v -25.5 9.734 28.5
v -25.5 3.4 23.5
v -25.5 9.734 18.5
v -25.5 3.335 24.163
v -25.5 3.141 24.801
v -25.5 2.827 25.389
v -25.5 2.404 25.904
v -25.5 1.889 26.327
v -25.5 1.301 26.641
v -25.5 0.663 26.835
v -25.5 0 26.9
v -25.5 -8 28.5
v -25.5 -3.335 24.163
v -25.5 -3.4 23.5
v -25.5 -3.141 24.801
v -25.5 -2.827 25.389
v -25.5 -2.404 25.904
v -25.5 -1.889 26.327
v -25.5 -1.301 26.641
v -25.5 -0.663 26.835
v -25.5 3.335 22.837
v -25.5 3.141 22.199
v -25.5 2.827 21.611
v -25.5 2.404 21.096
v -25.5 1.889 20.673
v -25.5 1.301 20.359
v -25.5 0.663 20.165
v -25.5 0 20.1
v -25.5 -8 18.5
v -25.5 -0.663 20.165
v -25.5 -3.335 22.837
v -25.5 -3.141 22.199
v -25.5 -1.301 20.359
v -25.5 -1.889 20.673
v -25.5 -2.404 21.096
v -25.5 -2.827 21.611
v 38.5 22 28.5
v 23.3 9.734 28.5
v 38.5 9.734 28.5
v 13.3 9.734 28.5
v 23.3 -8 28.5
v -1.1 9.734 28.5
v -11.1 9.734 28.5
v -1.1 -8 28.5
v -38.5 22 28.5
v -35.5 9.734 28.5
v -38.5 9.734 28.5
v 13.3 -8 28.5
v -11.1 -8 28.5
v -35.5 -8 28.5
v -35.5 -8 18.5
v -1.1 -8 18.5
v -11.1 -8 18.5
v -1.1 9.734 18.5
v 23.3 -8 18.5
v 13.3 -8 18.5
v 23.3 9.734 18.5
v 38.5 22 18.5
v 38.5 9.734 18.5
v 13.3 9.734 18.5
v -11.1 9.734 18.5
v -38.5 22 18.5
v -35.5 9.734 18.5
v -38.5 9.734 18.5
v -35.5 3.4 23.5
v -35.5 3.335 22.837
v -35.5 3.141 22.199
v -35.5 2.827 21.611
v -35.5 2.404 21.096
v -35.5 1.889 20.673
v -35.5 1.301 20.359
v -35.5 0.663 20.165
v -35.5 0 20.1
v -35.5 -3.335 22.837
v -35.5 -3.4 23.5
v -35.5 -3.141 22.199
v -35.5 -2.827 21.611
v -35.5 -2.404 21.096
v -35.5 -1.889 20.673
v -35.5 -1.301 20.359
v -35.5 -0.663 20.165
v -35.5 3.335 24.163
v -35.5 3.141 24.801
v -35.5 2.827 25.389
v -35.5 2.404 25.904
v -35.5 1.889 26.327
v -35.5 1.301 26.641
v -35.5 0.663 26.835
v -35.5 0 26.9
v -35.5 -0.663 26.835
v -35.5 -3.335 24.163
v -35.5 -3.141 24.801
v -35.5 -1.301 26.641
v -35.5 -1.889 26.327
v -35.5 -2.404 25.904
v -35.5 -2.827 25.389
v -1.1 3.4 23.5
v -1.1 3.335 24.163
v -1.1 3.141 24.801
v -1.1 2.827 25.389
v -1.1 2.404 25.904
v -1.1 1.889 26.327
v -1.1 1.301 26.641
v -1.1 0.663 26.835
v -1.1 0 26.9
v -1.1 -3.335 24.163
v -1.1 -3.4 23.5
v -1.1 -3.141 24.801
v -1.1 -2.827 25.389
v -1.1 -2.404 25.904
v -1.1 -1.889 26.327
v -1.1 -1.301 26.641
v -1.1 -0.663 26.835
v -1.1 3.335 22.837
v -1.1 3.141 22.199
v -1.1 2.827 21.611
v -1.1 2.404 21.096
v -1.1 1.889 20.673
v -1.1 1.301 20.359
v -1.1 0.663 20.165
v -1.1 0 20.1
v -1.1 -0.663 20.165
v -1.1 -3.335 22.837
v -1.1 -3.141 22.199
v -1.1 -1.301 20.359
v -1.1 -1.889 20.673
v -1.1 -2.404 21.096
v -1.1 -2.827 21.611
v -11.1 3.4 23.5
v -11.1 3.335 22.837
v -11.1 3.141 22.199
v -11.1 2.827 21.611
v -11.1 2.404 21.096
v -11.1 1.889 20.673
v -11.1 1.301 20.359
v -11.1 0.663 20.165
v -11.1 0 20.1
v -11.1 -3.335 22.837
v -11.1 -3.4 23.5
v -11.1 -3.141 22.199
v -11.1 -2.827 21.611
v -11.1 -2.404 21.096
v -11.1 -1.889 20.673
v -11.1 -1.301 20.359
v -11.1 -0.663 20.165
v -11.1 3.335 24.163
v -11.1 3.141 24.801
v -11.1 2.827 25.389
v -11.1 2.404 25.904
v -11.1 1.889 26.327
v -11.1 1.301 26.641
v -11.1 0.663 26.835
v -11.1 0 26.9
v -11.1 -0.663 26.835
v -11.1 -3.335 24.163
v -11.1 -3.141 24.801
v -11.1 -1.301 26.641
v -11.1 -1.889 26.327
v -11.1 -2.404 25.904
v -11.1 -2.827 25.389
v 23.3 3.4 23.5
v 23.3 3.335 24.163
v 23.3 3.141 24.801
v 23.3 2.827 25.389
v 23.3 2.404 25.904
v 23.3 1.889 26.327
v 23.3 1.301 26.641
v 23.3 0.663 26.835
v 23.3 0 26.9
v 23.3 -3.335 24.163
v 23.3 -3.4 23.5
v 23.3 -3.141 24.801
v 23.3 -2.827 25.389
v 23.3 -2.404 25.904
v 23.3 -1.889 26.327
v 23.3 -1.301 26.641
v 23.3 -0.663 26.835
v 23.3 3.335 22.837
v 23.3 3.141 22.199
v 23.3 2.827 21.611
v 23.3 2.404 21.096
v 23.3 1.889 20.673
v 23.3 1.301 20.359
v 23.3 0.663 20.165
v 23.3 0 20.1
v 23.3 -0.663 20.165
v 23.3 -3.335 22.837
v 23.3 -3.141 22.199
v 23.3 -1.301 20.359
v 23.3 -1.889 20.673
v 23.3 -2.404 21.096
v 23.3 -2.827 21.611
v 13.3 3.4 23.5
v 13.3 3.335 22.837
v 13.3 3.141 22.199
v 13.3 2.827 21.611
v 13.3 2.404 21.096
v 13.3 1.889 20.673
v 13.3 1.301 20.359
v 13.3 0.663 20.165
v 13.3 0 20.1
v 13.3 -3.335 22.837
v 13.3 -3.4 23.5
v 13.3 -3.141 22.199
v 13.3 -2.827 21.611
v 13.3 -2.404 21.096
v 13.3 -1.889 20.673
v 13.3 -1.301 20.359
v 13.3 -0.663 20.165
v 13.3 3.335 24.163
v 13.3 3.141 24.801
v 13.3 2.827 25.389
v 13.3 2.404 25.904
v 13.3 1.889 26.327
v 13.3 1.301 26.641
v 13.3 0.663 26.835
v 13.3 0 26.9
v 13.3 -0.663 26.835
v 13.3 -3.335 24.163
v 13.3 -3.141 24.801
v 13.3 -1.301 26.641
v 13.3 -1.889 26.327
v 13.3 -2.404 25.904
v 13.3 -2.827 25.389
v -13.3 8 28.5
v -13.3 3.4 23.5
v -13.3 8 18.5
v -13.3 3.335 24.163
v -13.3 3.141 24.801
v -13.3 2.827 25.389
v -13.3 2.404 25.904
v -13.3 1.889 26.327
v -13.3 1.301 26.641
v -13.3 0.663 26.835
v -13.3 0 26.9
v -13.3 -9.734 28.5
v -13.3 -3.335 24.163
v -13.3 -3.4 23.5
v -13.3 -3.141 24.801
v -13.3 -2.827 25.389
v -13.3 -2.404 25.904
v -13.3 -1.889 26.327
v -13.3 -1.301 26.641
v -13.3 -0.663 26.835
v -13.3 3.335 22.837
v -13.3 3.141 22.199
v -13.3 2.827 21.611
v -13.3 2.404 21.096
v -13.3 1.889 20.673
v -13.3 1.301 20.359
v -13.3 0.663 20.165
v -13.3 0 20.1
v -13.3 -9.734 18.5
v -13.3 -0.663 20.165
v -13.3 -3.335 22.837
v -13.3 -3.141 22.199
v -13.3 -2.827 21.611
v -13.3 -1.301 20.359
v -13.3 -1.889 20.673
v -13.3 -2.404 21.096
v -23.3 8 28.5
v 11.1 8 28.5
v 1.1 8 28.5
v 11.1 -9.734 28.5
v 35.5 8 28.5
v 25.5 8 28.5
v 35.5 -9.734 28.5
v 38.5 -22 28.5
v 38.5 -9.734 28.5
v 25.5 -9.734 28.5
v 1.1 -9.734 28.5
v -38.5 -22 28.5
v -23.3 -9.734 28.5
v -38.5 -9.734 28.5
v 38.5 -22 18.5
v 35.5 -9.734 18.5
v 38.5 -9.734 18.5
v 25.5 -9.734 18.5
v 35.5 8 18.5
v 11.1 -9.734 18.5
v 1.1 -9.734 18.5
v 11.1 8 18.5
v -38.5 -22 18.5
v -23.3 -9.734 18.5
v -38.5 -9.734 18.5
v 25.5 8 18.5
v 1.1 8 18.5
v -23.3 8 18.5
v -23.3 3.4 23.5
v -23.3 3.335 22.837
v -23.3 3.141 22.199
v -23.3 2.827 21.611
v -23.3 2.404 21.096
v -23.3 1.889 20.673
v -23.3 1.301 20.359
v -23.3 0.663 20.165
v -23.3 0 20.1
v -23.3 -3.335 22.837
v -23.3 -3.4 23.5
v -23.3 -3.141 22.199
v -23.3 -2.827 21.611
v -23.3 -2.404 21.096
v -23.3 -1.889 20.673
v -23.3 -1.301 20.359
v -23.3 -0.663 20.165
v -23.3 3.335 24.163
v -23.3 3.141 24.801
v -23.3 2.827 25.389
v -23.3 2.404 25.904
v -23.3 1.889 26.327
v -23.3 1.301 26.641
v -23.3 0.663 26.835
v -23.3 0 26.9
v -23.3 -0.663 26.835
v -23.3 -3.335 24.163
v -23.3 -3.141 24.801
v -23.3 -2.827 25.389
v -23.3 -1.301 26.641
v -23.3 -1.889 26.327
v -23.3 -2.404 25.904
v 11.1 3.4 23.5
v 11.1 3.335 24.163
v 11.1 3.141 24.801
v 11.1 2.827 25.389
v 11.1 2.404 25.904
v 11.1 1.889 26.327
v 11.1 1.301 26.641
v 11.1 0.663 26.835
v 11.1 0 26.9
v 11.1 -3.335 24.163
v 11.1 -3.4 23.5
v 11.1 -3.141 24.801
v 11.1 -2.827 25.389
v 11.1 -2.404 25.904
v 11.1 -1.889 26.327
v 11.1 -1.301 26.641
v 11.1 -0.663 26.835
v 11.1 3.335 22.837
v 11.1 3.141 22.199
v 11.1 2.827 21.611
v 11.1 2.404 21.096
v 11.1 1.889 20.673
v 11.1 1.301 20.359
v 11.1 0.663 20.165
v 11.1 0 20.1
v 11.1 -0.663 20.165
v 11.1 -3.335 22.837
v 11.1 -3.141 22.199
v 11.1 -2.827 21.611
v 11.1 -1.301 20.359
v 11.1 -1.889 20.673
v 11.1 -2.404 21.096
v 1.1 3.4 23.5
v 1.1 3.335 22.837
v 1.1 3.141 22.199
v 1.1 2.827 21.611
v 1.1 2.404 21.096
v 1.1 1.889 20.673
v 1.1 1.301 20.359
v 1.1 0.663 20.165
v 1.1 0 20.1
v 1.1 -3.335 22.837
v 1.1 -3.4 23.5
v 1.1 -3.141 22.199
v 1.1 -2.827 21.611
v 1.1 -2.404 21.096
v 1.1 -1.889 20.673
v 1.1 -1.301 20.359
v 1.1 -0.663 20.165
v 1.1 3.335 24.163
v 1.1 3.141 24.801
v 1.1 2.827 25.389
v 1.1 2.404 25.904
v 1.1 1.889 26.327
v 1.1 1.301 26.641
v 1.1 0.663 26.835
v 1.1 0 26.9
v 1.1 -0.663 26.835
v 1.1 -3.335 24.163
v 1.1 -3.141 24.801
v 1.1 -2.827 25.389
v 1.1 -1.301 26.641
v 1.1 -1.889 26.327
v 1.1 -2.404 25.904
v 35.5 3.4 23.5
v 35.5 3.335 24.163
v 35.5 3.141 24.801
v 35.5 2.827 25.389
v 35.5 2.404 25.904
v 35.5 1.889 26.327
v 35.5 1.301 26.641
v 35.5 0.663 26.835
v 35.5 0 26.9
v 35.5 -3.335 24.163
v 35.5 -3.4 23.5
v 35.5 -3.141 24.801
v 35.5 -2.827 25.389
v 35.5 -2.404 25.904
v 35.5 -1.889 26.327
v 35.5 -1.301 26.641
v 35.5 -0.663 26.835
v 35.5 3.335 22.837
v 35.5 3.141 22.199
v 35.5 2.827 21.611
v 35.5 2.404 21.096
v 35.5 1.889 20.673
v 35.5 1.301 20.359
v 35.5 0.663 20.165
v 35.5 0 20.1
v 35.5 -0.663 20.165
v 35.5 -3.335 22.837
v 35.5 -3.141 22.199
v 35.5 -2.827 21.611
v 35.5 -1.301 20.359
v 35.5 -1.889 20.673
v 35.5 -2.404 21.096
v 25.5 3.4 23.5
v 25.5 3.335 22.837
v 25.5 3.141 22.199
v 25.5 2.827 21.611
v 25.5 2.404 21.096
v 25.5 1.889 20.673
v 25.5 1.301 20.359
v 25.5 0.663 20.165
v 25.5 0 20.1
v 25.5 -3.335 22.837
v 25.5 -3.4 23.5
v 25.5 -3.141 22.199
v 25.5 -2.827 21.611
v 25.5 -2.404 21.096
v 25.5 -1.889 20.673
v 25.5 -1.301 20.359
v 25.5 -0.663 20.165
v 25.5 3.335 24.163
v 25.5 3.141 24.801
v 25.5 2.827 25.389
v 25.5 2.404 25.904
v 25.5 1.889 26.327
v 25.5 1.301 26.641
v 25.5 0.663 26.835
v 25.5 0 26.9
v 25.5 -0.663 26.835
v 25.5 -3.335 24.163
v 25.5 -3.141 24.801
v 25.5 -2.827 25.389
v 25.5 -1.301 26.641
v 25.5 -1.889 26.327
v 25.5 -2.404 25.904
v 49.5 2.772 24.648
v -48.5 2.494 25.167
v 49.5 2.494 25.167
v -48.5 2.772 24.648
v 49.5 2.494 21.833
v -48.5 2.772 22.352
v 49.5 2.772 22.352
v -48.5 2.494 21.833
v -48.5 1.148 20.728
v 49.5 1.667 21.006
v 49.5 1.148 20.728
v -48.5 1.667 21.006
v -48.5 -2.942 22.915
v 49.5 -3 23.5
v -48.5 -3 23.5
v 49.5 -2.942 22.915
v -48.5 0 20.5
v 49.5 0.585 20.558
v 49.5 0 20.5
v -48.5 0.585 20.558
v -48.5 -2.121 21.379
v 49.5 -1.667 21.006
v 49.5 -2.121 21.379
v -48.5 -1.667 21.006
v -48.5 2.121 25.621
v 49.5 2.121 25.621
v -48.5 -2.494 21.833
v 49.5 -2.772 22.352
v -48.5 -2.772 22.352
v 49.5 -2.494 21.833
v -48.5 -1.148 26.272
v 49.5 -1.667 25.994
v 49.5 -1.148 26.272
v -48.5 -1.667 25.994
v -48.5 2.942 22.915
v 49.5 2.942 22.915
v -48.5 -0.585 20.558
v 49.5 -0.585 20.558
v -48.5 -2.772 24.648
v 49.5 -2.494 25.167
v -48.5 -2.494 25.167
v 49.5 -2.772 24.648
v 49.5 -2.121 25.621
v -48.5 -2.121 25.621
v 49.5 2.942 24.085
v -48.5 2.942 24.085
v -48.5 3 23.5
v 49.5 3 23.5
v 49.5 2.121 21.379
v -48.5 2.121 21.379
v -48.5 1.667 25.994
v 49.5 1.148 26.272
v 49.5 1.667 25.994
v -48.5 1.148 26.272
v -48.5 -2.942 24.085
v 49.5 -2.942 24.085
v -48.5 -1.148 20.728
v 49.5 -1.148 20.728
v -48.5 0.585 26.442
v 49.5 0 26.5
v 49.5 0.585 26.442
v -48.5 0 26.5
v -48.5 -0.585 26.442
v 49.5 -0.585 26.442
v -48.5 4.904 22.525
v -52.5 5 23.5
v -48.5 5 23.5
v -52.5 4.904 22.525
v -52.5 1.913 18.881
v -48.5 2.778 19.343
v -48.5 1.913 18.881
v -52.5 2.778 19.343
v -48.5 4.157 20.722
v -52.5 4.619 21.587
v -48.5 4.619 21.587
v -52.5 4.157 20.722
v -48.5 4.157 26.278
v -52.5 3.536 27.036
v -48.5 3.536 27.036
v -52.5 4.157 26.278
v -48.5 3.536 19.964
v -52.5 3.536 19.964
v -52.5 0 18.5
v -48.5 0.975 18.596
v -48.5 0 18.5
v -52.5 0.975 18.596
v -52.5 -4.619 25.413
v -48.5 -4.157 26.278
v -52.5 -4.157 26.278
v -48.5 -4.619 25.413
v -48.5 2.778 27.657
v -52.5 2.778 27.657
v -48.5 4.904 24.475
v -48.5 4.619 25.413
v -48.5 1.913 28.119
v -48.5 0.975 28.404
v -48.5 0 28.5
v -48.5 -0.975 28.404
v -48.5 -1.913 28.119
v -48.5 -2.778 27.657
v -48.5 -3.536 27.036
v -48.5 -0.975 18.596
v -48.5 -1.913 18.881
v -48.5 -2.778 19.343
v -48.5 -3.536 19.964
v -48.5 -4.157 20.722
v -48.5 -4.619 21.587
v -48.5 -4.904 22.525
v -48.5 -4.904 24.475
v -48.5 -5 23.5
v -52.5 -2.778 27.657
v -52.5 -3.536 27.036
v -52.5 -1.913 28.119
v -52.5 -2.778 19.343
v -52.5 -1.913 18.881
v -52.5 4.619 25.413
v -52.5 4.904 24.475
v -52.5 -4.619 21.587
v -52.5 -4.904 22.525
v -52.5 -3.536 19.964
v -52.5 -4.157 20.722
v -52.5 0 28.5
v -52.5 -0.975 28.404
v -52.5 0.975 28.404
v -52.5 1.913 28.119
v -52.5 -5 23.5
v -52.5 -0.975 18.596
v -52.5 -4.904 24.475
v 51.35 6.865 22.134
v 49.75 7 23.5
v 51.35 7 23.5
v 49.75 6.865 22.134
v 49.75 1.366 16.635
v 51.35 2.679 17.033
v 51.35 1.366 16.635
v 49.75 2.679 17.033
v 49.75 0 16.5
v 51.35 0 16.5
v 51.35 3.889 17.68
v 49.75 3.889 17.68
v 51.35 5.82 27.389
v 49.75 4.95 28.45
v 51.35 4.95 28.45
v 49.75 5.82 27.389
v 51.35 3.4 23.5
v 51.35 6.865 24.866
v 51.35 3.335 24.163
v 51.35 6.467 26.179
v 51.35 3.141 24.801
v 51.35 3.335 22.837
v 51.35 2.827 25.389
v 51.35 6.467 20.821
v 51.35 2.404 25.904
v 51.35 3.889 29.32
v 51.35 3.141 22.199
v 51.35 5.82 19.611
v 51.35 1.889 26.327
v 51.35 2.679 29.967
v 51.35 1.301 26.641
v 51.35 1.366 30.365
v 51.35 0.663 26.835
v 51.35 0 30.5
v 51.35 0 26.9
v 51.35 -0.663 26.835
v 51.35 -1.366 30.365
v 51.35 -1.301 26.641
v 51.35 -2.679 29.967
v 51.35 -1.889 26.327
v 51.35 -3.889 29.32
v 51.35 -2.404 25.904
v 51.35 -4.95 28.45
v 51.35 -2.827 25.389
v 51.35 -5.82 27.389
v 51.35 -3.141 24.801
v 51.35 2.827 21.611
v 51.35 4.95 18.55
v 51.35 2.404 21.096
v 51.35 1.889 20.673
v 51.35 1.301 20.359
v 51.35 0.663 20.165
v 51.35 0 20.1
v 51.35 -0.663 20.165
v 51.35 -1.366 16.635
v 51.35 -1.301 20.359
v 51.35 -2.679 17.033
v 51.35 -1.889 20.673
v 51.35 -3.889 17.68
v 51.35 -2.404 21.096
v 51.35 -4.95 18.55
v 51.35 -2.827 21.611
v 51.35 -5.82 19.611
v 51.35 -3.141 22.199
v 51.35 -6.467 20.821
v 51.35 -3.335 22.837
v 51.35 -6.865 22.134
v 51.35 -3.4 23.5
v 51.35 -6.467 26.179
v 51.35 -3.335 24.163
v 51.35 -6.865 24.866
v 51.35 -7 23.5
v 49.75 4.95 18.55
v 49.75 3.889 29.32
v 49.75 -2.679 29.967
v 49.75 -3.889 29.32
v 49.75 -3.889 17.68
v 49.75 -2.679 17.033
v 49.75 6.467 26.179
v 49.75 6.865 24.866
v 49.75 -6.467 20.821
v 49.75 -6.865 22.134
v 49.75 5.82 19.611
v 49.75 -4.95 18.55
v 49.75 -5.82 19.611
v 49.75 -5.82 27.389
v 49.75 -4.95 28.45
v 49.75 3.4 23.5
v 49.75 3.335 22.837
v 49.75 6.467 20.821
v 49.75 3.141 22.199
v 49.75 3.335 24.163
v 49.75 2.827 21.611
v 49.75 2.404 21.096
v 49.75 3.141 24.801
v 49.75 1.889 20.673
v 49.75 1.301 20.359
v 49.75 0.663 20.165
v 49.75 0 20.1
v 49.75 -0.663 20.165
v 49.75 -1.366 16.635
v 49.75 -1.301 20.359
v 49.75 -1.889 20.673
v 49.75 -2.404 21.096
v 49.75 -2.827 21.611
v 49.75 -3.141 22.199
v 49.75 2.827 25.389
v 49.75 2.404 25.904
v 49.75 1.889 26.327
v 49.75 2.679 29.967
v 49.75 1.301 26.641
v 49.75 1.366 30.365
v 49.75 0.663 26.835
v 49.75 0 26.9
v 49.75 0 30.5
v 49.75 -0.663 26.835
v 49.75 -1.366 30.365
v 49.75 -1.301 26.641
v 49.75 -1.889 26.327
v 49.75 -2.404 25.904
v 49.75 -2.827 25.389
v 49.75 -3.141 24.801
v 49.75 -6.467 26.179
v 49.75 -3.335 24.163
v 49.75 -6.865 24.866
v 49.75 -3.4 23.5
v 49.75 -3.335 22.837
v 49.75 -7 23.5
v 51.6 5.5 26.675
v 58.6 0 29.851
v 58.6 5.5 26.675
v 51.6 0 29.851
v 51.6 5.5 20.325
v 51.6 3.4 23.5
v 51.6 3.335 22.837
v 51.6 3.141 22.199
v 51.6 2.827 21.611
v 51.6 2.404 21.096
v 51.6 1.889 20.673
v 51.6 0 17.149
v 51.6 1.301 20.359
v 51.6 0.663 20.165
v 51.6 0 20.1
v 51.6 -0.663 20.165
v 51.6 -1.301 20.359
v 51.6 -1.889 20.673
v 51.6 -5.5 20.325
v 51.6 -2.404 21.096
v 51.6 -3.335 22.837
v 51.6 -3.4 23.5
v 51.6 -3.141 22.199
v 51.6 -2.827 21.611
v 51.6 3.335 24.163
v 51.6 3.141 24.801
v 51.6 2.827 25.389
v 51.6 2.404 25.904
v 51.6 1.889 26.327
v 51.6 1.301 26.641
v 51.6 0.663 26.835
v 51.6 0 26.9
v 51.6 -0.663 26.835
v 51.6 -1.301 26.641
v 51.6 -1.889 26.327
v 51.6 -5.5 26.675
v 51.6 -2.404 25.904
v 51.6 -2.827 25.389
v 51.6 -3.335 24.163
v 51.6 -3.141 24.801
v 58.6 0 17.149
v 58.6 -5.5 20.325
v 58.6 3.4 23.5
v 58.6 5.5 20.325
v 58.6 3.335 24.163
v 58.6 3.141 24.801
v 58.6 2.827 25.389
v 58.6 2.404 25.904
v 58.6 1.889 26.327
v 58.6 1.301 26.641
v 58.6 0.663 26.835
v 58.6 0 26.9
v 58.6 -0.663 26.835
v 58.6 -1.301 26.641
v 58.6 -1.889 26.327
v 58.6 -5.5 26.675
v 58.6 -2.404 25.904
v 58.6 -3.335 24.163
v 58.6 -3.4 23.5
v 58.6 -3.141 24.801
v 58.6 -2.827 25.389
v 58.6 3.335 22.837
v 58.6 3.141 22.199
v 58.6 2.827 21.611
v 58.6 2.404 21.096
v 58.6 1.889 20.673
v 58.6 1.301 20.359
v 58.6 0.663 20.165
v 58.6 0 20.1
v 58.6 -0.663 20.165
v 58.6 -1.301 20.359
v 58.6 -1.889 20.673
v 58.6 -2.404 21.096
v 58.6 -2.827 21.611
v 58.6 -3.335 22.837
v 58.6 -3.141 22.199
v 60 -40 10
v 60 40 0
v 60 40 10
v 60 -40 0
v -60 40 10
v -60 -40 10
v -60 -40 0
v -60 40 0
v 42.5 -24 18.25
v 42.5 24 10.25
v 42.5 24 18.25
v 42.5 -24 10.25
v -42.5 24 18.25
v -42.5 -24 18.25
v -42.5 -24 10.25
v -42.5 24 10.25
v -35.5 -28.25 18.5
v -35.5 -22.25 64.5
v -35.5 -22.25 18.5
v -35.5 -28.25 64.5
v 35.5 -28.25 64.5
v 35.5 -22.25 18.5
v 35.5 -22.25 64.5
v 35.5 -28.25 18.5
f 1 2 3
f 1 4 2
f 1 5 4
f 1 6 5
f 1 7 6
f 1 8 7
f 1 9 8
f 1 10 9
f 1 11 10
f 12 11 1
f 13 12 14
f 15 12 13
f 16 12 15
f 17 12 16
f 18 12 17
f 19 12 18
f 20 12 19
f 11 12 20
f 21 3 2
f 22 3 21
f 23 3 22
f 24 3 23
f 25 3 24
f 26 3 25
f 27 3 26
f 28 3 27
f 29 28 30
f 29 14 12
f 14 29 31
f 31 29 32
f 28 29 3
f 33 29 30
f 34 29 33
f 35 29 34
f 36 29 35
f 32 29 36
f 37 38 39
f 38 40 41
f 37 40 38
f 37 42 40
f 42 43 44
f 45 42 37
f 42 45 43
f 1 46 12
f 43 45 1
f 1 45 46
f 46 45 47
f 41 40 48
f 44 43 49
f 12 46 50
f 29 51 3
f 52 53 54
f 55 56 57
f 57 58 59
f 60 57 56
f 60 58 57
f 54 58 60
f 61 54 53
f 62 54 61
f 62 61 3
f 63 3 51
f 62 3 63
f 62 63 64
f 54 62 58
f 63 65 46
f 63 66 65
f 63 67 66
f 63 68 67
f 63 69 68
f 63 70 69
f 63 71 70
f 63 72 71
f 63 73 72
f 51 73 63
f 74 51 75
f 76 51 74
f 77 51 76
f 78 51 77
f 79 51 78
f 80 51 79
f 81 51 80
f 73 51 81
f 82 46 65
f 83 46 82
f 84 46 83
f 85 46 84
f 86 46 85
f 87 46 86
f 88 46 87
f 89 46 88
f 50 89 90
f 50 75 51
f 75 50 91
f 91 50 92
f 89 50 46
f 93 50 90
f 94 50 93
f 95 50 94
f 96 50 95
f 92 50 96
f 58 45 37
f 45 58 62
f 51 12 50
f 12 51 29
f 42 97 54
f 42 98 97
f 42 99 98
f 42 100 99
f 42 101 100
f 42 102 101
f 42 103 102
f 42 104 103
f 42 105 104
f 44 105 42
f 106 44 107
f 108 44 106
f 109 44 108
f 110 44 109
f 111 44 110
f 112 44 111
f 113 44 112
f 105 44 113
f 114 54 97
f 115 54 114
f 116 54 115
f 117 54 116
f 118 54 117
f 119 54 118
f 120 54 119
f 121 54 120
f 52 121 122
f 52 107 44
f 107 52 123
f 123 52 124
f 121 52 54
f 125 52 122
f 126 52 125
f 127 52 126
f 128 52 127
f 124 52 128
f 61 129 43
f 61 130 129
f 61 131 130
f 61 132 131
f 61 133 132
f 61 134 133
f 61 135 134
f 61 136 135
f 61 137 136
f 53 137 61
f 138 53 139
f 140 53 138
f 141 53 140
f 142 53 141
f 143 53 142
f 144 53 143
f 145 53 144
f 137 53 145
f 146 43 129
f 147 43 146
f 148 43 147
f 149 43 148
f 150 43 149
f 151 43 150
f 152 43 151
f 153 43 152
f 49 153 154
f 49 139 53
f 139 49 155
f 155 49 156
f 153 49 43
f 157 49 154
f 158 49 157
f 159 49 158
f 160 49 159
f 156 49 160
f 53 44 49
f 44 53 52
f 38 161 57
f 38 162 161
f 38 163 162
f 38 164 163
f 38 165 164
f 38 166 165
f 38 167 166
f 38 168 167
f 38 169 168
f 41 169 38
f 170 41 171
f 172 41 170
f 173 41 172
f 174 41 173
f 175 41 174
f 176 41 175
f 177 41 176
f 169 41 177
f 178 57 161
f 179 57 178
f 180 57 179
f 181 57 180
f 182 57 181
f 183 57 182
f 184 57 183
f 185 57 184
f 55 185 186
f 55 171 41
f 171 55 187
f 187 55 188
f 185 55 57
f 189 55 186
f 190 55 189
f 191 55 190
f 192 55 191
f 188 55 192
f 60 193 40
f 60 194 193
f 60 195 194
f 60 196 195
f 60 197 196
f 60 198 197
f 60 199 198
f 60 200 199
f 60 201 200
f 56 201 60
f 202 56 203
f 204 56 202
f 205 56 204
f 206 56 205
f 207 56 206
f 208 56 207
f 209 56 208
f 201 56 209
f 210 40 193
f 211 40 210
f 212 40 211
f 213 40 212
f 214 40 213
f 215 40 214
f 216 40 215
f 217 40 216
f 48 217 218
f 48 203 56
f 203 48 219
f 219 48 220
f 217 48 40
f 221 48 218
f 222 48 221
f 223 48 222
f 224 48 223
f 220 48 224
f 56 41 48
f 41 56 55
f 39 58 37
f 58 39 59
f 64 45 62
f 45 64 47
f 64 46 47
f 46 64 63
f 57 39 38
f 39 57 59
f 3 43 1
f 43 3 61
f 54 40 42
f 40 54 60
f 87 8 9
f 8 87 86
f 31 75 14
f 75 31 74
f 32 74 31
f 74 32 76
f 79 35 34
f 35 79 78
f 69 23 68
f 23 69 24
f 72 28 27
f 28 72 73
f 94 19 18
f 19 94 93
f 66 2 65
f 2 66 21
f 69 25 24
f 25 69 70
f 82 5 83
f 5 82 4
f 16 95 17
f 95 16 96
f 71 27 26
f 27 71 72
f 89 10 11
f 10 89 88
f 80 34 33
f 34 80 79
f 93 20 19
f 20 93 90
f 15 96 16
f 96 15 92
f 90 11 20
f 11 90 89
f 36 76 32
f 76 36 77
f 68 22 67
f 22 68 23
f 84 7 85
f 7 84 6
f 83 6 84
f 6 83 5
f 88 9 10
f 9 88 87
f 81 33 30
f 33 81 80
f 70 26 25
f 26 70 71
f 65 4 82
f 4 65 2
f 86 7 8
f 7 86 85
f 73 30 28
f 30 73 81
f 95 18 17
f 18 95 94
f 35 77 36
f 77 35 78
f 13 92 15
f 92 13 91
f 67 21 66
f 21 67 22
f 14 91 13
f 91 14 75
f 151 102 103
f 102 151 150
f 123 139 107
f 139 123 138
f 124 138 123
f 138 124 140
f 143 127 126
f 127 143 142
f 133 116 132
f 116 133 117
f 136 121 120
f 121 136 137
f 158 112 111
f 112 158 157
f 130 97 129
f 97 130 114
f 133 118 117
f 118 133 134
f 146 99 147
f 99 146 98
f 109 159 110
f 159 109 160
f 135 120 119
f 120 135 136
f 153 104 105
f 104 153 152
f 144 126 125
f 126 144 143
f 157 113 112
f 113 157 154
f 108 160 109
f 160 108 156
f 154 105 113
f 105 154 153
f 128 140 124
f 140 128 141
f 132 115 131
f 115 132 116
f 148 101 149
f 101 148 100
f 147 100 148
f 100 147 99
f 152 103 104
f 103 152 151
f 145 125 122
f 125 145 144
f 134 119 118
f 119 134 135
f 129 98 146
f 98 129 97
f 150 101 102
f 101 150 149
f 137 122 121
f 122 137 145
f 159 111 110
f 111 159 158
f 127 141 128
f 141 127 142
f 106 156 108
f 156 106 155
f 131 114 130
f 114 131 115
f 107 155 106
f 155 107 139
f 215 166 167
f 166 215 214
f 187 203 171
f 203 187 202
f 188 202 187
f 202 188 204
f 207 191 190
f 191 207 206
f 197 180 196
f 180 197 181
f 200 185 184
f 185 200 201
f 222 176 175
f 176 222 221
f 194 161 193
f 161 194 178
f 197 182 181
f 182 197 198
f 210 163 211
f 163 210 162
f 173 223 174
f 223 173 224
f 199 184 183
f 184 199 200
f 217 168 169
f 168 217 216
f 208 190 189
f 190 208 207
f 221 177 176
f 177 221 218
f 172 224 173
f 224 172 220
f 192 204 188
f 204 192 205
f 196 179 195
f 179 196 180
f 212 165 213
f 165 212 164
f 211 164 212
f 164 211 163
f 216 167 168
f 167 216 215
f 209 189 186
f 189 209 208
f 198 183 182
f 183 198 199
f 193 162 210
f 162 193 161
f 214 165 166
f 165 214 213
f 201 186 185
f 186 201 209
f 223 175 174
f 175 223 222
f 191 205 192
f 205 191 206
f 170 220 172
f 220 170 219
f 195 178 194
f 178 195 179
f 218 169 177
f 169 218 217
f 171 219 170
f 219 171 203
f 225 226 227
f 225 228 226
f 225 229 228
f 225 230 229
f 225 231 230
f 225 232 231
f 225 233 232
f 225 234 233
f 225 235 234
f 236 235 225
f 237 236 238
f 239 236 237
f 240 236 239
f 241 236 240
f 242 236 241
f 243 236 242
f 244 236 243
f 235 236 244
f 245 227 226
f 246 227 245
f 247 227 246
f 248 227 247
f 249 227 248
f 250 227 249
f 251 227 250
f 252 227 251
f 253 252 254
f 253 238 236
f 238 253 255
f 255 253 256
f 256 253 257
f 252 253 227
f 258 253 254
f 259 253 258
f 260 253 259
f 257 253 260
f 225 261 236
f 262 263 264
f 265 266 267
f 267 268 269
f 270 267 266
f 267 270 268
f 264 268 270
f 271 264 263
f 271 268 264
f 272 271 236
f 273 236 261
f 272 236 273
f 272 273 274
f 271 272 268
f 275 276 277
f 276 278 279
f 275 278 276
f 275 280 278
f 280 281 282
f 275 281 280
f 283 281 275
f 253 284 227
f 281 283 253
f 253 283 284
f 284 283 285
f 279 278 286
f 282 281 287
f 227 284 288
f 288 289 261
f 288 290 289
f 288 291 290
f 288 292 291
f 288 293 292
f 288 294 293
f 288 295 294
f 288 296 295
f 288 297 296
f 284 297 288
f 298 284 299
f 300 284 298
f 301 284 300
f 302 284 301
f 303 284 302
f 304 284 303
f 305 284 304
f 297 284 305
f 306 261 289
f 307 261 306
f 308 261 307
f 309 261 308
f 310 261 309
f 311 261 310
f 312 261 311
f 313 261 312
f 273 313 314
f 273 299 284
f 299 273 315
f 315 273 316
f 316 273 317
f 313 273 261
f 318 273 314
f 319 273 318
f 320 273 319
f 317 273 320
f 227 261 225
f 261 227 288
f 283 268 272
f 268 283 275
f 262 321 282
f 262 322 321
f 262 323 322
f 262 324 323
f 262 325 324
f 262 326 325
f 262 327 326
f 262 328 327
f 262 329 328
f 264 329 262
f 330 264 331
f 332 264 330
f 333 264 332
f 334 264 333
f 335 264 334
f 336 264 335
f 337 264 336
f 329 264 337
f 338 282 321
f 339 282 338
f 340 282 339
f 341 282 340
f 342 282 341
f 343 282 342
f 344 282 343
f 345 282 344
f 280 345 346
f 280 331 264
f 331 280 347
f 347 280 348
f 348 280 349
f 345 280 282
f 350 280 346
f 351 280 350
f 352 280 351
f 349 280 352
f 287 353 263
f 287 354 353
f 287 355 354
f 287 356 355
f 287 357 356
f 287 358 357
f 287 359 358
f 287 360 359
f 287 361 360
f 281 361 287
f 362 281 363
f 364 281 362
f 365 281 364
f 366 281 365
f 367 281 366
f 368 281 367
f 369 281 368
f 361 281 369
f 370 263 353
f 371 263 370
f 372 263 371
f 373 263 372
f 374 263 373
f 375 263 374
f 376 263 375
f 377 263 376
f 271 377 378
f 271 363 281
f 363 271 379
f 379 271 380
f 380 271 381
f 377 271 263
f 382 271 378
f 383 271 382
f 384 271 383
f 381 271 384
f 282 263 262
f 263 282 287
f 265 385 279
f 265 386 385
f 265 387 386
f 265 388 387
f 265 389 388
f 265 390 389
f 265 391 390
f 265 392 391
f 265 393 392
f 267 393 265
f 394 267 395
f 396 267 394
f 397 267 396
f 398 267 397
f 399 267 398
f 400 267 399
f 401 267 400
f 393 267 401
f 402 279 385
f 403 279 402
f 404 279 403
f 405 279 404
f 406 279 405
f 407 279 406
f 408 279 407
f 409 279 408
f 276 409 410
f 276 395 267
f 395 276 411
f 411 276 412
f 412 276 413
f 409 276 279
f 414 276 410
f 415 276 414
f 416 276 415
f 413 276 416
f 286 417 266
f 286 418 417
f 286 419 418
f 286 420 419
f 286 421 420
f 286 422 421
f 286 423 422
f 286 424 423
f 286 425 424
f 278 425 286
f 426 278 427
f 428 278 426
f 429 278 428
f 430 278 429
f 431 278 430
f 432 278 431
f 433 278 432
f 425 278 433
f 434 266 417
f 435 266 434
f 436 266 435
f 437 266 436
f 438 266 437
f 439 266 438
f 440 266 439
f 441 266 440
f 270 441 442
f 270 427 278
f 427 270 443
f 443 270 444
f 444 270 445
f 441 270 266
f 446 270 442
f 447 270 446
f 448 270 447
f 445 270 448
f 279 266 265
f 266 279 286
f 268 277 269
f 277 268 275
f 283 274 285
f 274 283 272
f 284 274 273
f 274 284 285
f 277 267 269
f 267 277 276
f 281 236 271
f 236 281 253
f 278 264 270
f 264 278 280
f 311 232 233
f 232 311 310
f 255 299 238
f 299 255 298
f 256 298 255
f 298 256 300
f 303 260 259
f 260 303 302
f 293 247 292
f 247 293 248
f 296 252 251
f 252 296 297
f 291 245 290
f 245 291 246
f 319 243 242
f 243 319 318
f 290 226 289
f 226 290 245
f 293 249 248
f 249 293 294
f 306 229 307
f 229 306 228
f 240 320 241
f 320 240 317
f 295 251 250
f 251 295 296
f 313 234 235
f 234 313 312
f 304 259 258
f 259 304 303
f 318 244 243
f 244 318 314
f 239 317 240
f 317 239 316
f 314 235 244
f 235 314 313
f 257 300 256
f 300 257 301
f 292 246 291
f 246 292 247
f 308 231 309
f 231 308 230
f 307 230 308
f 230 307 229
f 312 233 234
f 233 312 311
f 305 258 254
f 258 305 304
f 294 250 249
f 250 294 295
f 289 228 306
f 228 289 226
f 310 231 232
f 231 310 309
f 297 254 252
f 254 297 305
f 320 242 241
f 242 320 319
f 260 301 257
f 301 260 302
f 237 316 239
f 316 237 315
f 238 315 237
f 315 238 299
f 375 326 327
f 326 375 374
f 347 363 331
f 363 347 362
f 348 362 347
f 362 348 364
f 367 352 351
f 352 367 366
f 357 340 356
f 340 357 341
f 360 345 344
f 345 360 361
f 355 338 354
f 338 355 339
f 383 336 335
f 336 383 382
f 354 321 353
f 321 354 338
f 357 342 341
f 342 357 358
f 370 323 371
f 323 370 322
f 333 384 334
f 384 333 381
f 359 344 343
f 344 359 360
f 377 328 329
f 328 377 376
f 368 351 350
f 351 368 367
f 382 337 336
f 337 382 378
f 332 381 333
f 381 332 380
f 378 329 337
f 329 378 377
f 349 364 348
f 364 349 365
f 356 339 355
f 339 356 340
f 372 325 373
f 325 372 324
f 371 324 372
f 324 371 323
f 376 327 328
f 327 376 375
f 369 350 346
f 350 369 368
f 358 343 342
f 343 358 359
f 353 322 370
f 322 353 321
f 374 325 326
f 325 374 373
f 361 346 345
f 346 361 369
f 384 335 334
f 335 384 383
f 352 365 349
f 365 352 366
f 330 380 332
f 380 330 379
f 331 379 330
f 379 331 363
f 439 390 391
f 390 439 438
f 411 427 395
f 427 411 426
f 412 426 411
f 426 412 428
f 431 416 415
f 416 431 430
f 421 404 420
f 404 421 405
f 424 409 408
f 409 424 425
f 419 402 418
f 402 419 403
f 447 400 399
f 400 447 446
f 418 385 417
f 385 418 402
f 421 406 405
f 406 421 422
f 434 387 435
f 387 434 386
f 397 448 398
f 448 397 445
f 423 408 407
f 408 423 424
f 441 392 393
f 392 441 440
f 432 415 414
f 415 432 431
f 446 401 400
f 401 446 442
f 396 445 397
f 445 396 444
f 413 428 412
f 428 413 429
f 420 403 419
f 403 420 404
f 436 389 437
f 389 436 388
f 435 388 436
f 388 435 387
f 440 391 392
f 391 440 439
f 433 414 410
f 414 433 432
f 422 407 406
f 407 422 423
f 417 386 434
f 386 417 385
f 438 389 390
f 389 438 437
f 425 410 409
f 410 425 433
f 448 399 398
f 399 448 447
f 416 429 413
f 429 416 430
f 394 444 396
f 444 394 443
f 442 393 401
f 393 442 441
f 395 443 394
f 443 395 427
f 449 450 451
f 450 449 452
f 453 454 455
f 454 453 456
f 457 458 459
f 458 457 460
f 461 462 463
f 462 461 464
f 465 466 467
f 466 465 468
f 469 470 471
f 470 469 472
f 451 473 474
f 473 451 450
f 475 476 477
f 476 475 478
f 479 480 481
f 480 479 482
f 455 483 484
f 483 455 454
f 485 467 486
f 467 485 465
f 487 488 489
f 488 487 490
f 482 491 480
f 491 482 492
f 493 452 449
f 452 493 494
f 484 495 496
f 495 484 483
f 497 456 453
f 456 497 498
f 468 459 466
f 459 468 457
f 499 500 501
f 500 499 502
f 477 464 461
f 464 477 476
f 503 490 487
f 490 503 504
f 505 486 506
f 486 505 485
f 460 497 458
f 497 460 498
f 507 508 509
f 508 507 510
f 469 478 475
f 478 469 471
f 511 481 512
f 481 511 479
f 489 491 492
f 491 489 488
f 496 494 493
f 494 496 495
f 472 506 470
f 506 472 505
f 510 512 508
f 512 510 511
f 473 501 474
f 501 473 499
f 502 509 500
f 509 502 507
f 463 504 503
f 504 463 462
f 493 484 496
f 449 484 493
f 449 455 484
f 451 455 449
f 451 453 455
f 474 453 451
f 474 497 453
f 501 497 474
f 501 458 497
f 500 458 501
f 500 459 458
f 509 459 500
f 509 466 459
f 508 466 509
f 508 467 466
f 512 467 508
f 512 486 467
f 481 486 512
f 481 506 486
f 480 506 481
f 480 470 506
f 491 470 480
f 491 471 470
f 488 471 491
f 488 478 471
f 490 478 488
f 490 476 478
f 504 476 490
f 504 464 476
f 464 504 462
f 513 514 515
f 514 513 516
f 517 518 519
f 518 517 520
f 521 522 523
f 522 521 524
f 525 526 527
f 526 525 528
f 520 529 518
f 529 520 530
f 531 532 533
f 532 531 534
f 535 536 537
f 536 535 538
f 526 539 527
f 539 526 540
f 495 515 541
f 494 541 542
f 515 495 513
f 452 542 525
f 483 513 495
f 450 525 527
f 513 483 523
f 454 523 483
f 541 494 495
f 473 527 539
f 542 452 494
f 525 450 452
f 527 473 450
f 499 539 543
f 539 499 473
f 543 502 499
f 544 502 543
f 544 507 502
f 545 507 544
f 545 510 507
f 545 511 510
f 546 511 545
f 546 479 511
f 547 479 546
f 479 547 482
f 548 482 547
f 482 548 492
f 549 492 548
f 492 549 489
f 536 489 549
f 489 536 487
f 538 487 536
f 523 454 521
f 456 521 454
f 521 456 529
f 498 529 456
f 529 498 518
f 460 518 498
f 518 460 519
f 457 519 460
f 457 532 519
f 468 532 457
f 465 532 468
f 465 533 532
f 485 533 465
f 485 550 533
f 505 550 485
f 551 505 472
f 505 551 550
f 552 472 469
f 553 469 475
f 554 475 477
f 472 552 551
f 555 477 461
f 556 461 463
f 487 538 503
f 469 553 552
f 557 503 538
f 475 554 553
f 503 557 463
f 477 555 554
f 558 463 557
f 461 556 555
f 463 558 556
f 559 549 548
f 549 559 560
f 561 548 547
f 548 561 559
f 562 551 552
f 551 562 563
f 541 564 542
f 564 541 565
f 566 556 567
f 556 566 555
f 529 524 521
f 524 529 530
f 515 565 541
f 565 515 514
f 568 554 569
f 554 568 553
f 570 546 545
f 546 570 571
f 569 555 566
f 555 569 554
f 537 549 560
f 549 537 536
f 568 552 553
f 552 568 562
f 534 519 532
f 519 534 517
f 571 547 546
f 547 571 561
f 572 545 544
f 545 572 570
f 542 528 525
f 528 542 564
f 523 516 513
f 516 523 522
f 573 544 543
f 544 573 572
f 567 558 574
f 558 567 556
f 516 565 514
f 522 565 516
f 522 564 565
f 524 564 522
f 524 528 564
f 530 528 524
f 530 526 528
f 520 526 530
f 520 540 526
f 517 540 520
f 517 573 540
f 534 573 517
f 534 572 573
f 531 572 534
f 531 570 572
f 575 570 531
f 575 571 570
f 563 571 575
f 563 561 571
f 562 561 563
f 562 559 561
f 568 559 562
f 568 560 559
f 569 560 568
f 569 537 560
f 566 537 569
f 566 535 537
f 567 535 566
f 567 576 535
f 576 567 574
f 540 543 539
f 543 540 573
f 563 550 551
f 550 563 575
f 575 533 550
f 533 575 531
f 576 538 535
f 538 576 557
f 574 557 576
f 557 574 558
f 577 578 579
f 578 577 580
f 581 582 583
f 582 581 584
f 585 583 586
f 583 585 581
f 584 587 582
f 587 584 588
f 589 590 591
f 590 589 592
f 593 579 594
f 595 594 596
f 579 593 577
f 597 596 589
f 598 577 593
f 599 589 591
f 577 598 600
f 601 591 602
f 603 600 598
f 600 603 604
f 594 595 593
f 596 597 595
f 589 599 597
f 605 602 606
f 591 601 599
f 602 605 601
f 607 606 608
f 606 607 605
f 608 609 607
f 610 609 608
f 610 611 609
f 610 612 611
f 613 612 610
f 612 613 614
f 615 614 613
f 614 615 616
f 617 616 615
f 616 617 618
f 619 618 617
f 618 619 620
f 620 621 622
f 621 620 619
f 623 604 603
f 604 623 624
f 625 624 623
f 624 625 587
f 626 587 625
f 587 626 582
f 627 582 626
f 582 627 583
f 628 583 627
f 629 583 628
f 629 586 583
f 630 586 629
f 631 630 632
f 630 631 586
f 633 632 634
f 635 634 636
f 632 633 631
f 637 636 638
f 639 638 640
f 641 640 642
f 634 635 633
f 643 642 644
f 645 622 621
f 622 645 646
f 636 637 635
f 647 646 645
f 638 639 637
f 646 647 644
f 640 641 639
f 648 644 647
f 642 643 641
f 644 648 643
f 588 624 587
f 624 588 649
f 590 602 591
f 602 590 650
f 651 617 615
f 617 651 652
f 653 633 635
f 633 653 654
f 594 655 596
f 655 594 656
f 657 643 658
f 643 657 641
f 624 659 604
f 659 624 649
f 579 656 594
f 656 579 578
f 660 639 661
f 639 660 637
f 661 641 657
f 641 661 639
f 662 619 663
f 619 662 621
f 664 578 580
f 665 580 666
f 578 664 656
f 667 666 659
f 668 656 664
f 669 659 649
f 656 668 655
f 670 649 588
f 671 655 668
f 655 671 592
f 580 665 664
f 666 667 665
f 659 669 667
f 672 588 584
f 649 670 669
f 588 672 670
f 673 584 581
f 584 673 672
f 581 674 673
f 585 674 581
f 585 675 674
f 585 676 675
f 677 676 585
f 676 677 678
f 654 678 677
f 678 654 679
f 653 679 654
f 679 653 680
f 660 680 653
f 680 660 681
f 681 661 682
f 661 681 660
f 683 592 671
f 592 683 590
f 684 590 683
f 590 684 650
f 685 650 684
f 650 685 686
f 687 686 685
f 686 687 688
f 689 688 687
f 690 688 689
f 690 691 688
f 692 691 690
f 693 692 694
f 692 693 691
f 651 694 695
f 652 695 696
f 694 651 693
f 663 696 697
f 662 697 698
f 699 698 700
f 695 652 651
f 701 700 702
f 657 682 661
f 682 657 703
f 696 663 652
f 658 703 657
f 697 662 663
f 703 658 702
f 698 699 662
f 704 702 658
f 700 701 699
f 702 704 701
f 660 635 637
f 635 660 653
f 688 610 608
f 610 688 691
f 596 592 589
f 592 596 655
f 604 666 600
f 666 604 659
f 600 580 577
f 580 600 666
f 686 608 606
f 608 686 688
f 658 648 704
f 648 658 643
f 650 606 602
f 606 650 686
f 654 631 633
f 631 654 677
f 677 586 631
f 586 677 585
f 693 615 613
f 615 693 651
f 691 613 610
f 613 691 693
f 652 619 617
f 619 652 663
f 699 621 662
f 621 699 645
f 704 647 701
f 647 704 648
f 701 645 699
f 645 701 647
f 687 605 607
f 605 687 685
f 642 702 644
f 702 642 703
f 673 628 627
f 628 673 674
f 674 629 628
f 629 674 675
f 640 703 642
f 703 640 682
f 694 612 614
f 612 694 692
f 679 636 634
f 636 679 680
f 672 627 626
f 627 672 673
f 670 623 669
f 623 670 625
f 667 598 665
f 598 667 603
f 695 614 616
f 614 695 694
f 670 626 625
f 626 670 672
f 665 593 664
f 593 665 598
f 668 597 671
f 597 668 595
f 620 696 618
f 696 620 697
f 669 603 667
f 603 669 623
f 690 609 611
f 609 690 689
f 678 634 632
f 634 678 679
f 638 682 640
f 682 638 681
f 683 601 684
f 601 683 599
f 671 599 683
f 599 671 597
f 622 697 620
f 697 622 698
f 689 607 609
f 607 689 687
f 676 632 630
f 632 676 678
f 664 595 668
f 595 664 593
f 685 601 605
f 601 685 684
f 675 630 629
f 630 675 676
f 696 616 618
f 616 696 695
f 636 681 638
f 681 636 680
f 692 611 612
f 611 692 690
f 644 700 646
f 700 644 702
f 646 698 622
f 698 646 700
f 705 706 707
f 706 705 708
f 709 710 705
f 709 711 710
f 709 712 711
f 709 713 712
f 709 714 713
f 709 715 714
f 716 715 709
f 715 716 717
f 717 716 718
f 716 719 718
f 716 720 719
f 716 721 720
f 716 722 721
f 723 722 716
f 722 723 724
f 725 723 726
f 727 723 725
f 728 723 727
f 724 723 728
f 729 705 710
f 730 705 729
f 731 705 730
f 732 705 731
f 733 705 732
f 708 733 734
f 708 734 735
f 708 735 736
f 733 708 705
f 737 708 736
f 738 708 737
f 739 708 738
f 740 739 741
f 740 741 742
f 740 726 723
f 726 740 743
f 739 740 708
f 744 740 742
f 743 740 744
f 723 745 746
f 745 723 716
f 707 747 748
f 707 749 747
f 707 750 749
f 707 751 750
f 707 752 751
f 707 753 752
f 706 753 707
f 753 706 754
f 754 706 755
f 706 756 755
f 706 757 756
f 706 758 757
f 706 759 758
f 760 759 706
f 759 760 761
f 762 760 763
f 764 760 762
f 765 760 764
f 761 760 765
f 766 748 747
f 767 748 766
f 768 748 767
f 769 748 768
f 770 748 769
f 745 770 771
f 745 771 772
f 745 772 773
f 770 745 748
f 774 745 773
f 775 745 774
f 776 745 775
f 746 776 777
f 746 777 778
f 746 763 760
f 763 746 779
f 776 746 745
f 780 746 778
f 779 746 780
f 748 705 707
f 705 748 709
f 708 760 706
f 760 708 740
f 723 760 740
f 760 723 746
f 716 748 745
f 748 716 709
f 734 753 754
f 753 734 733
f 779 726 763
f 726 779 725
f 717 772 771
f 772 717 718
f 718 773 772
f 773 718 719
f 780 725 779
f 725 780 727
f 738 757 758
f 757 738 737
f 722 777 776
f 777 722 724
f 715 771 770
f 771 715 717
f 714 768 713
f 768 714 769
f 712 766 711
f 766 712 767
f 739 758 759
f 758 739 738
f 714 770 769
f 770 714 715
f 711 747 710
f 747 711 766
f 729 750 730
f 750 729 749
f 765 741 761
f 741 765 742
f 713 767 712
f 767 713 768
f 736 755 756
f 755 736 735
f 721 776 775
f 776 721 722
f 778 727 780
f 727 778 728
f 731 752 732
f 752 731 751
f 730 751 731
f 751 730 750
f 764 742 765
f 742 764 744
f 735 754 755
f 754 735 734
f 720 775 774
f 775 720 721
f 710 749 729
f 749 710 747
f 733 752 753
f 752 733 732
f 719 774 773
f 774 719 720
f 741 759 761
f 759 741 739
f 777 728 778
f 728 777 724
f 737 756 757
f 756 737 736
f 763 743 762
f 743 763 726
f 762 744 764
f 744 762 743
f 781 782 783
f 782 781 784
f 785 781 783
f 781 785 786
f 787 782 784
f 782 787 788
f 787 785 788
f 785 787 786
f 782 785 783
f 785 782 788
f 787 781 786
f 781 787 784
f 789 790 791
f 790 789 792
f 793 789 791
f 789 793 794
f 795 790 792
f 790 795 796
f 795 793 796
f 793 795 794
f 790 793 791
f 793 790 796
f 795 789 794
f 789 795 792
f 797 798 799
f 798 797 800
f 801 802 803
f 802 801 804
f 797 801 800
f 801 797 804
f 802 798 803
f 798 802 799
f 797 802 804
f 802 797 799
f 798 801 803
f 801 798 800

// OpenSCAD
$fn = 32;

// ------------------------------------------------------------------------
// Comb hinge with flap: leaf 77 x 22 mm, pin d6, flap 46 mm
// Every part is its own module, assembly() places every instance.
// ------------------------------------------------------------------------

// --- part 1 ---
module hinge_bed() {
  difference() {
    translate([-60, -40, 0]) cube([120, 80, 10]);
  }
}

// --- part 2 ---
module hinge_riser() {
  difference() {
    translate([-42.5, -24, 0]) cube([85, 48, 8]);
  }
}

// --- part 3 ---
module hinge_leaf_a() {
  difference() {
    union() {
      translate([-35.5, -8, -5]) cube([10, 30, 10]);
      translate([-11.1, -8, -5]) cube([10, 30, 10]);
      translate([13.3, -8, -5]) cube([10, 30, 10]);
      translate([-38.5, 9.734, -5]) cube([77, 12.266, 10]);
    }
    translate([-30.5, 0, 0]) rotate([0, 90, 0]) cylinder(h = 12, d = 6.8, center = true);
    translate([-6.1, 0, 0]) rotate([0, 90, 0]) cylinder(h = 12, d = 6.8, center = true);
    translate([18.3, 0, 0]) rotate([0, 90, 0]) cylinder(h = 12, d = 6.8, center = true);
  }
}

// --- part 4 ---
module hinge_leaf_b() {
  difference() {
    union() {
      translate([-23.3, -22, -5]) cube([10, 30, 10]);
      translate([1.1, -22, -5]) cube([10, 30, 10]);
      translate([25.5, -22, -5]) cube([10, 30, 10]);
      translate([-38.5, -22, -5]) cube([77, 12.266, 10]);
    }
    translate([-18.3, 0, 0]) rotate([0, 90, 0]) cylinder(h = 12, d = 6.8, center = true);
    translate([6.1, 0, 0]) rotate([0, 90, 0]) cylinder(h = 12, d = 6.8, center = true);
    translate([30.5, 0, 0]) rotate([0, 90, 0]) cylinder(h = 12, d = 6.8, center = true);
  }
}

// --- part 5 ---
module hinge_flap() {
  difference() {
    translate([-35.5, -23, 0]) cube([71, 46, 6]);
  }
}

// --- part 6 ---
module hinge_pin() {
  rotate([0, 90, 0]) cylinder(h = 99, d = 6, center = true);
  translate([-52.5, 0, 0]) rotate([0, 90, 0]) cylinder(h = 4, d = 10);
}

// --- part 7 ---
module pin_washer() {
  difference() {
      translate([0, 0, 0]) cylinder(h = 1.6, d = 14);
      translate([0, 0, -1]) cylinder(h = 3.6, d = 6.8);
    }
}

// --- part 8 ---
module pin_nut() {
  difference() {
    linear_extrude(height = 7) polygon(points = [[6.351, 0], [3.175, 5.5], [-3.175, 5.5], [-6.351, 0], [-3.175, -5.5], [3.175, -5.5]]);
    translate([0, 0, -1]) cylinder(h = 9, d = 6.8);
  }
}

// --- assembly ---
module assembly() {
  color([0.80, 0.24, 0.20]) translate([0, 0, 0]) rotate([0, 0, 0]) hinge_bed();
  color([0.20, 0.45, 0.75]) translate([0, 0, 10.25]) rotate([0, 0, 0]) hinge_riser();
  color([0.25, 0.62, 0.32]) translate([0, 0, 23.5]) rotate([0, 0, 0]) hinge_leaf_a();
  color([0.92, 0.70, 0.18]) translate([0, 0, 23.5]) rotate([0, 0, 0]) hinge_leaf_b();
  color([0.58, 0.35, 0.70]) translate([0, -22.25, 41.5]) rotate([90, 0, 0]) hinge_flap();
  color([0.16, 0.66, 0.66]) translate([0, 0, 23.5]) rotate([0, 0, 0]) hinge_pin();
  color([0.85, 0.48, 0.18]) translate([49.75, 0, 23.5]) rotate([0, 90, 0]) pin_washer();
  color([0.55, 0.60, 0.65]) translate([51.6, 0, 23.5]) rotate([0, 90, 0]) pin_nut();
}

assembly();
